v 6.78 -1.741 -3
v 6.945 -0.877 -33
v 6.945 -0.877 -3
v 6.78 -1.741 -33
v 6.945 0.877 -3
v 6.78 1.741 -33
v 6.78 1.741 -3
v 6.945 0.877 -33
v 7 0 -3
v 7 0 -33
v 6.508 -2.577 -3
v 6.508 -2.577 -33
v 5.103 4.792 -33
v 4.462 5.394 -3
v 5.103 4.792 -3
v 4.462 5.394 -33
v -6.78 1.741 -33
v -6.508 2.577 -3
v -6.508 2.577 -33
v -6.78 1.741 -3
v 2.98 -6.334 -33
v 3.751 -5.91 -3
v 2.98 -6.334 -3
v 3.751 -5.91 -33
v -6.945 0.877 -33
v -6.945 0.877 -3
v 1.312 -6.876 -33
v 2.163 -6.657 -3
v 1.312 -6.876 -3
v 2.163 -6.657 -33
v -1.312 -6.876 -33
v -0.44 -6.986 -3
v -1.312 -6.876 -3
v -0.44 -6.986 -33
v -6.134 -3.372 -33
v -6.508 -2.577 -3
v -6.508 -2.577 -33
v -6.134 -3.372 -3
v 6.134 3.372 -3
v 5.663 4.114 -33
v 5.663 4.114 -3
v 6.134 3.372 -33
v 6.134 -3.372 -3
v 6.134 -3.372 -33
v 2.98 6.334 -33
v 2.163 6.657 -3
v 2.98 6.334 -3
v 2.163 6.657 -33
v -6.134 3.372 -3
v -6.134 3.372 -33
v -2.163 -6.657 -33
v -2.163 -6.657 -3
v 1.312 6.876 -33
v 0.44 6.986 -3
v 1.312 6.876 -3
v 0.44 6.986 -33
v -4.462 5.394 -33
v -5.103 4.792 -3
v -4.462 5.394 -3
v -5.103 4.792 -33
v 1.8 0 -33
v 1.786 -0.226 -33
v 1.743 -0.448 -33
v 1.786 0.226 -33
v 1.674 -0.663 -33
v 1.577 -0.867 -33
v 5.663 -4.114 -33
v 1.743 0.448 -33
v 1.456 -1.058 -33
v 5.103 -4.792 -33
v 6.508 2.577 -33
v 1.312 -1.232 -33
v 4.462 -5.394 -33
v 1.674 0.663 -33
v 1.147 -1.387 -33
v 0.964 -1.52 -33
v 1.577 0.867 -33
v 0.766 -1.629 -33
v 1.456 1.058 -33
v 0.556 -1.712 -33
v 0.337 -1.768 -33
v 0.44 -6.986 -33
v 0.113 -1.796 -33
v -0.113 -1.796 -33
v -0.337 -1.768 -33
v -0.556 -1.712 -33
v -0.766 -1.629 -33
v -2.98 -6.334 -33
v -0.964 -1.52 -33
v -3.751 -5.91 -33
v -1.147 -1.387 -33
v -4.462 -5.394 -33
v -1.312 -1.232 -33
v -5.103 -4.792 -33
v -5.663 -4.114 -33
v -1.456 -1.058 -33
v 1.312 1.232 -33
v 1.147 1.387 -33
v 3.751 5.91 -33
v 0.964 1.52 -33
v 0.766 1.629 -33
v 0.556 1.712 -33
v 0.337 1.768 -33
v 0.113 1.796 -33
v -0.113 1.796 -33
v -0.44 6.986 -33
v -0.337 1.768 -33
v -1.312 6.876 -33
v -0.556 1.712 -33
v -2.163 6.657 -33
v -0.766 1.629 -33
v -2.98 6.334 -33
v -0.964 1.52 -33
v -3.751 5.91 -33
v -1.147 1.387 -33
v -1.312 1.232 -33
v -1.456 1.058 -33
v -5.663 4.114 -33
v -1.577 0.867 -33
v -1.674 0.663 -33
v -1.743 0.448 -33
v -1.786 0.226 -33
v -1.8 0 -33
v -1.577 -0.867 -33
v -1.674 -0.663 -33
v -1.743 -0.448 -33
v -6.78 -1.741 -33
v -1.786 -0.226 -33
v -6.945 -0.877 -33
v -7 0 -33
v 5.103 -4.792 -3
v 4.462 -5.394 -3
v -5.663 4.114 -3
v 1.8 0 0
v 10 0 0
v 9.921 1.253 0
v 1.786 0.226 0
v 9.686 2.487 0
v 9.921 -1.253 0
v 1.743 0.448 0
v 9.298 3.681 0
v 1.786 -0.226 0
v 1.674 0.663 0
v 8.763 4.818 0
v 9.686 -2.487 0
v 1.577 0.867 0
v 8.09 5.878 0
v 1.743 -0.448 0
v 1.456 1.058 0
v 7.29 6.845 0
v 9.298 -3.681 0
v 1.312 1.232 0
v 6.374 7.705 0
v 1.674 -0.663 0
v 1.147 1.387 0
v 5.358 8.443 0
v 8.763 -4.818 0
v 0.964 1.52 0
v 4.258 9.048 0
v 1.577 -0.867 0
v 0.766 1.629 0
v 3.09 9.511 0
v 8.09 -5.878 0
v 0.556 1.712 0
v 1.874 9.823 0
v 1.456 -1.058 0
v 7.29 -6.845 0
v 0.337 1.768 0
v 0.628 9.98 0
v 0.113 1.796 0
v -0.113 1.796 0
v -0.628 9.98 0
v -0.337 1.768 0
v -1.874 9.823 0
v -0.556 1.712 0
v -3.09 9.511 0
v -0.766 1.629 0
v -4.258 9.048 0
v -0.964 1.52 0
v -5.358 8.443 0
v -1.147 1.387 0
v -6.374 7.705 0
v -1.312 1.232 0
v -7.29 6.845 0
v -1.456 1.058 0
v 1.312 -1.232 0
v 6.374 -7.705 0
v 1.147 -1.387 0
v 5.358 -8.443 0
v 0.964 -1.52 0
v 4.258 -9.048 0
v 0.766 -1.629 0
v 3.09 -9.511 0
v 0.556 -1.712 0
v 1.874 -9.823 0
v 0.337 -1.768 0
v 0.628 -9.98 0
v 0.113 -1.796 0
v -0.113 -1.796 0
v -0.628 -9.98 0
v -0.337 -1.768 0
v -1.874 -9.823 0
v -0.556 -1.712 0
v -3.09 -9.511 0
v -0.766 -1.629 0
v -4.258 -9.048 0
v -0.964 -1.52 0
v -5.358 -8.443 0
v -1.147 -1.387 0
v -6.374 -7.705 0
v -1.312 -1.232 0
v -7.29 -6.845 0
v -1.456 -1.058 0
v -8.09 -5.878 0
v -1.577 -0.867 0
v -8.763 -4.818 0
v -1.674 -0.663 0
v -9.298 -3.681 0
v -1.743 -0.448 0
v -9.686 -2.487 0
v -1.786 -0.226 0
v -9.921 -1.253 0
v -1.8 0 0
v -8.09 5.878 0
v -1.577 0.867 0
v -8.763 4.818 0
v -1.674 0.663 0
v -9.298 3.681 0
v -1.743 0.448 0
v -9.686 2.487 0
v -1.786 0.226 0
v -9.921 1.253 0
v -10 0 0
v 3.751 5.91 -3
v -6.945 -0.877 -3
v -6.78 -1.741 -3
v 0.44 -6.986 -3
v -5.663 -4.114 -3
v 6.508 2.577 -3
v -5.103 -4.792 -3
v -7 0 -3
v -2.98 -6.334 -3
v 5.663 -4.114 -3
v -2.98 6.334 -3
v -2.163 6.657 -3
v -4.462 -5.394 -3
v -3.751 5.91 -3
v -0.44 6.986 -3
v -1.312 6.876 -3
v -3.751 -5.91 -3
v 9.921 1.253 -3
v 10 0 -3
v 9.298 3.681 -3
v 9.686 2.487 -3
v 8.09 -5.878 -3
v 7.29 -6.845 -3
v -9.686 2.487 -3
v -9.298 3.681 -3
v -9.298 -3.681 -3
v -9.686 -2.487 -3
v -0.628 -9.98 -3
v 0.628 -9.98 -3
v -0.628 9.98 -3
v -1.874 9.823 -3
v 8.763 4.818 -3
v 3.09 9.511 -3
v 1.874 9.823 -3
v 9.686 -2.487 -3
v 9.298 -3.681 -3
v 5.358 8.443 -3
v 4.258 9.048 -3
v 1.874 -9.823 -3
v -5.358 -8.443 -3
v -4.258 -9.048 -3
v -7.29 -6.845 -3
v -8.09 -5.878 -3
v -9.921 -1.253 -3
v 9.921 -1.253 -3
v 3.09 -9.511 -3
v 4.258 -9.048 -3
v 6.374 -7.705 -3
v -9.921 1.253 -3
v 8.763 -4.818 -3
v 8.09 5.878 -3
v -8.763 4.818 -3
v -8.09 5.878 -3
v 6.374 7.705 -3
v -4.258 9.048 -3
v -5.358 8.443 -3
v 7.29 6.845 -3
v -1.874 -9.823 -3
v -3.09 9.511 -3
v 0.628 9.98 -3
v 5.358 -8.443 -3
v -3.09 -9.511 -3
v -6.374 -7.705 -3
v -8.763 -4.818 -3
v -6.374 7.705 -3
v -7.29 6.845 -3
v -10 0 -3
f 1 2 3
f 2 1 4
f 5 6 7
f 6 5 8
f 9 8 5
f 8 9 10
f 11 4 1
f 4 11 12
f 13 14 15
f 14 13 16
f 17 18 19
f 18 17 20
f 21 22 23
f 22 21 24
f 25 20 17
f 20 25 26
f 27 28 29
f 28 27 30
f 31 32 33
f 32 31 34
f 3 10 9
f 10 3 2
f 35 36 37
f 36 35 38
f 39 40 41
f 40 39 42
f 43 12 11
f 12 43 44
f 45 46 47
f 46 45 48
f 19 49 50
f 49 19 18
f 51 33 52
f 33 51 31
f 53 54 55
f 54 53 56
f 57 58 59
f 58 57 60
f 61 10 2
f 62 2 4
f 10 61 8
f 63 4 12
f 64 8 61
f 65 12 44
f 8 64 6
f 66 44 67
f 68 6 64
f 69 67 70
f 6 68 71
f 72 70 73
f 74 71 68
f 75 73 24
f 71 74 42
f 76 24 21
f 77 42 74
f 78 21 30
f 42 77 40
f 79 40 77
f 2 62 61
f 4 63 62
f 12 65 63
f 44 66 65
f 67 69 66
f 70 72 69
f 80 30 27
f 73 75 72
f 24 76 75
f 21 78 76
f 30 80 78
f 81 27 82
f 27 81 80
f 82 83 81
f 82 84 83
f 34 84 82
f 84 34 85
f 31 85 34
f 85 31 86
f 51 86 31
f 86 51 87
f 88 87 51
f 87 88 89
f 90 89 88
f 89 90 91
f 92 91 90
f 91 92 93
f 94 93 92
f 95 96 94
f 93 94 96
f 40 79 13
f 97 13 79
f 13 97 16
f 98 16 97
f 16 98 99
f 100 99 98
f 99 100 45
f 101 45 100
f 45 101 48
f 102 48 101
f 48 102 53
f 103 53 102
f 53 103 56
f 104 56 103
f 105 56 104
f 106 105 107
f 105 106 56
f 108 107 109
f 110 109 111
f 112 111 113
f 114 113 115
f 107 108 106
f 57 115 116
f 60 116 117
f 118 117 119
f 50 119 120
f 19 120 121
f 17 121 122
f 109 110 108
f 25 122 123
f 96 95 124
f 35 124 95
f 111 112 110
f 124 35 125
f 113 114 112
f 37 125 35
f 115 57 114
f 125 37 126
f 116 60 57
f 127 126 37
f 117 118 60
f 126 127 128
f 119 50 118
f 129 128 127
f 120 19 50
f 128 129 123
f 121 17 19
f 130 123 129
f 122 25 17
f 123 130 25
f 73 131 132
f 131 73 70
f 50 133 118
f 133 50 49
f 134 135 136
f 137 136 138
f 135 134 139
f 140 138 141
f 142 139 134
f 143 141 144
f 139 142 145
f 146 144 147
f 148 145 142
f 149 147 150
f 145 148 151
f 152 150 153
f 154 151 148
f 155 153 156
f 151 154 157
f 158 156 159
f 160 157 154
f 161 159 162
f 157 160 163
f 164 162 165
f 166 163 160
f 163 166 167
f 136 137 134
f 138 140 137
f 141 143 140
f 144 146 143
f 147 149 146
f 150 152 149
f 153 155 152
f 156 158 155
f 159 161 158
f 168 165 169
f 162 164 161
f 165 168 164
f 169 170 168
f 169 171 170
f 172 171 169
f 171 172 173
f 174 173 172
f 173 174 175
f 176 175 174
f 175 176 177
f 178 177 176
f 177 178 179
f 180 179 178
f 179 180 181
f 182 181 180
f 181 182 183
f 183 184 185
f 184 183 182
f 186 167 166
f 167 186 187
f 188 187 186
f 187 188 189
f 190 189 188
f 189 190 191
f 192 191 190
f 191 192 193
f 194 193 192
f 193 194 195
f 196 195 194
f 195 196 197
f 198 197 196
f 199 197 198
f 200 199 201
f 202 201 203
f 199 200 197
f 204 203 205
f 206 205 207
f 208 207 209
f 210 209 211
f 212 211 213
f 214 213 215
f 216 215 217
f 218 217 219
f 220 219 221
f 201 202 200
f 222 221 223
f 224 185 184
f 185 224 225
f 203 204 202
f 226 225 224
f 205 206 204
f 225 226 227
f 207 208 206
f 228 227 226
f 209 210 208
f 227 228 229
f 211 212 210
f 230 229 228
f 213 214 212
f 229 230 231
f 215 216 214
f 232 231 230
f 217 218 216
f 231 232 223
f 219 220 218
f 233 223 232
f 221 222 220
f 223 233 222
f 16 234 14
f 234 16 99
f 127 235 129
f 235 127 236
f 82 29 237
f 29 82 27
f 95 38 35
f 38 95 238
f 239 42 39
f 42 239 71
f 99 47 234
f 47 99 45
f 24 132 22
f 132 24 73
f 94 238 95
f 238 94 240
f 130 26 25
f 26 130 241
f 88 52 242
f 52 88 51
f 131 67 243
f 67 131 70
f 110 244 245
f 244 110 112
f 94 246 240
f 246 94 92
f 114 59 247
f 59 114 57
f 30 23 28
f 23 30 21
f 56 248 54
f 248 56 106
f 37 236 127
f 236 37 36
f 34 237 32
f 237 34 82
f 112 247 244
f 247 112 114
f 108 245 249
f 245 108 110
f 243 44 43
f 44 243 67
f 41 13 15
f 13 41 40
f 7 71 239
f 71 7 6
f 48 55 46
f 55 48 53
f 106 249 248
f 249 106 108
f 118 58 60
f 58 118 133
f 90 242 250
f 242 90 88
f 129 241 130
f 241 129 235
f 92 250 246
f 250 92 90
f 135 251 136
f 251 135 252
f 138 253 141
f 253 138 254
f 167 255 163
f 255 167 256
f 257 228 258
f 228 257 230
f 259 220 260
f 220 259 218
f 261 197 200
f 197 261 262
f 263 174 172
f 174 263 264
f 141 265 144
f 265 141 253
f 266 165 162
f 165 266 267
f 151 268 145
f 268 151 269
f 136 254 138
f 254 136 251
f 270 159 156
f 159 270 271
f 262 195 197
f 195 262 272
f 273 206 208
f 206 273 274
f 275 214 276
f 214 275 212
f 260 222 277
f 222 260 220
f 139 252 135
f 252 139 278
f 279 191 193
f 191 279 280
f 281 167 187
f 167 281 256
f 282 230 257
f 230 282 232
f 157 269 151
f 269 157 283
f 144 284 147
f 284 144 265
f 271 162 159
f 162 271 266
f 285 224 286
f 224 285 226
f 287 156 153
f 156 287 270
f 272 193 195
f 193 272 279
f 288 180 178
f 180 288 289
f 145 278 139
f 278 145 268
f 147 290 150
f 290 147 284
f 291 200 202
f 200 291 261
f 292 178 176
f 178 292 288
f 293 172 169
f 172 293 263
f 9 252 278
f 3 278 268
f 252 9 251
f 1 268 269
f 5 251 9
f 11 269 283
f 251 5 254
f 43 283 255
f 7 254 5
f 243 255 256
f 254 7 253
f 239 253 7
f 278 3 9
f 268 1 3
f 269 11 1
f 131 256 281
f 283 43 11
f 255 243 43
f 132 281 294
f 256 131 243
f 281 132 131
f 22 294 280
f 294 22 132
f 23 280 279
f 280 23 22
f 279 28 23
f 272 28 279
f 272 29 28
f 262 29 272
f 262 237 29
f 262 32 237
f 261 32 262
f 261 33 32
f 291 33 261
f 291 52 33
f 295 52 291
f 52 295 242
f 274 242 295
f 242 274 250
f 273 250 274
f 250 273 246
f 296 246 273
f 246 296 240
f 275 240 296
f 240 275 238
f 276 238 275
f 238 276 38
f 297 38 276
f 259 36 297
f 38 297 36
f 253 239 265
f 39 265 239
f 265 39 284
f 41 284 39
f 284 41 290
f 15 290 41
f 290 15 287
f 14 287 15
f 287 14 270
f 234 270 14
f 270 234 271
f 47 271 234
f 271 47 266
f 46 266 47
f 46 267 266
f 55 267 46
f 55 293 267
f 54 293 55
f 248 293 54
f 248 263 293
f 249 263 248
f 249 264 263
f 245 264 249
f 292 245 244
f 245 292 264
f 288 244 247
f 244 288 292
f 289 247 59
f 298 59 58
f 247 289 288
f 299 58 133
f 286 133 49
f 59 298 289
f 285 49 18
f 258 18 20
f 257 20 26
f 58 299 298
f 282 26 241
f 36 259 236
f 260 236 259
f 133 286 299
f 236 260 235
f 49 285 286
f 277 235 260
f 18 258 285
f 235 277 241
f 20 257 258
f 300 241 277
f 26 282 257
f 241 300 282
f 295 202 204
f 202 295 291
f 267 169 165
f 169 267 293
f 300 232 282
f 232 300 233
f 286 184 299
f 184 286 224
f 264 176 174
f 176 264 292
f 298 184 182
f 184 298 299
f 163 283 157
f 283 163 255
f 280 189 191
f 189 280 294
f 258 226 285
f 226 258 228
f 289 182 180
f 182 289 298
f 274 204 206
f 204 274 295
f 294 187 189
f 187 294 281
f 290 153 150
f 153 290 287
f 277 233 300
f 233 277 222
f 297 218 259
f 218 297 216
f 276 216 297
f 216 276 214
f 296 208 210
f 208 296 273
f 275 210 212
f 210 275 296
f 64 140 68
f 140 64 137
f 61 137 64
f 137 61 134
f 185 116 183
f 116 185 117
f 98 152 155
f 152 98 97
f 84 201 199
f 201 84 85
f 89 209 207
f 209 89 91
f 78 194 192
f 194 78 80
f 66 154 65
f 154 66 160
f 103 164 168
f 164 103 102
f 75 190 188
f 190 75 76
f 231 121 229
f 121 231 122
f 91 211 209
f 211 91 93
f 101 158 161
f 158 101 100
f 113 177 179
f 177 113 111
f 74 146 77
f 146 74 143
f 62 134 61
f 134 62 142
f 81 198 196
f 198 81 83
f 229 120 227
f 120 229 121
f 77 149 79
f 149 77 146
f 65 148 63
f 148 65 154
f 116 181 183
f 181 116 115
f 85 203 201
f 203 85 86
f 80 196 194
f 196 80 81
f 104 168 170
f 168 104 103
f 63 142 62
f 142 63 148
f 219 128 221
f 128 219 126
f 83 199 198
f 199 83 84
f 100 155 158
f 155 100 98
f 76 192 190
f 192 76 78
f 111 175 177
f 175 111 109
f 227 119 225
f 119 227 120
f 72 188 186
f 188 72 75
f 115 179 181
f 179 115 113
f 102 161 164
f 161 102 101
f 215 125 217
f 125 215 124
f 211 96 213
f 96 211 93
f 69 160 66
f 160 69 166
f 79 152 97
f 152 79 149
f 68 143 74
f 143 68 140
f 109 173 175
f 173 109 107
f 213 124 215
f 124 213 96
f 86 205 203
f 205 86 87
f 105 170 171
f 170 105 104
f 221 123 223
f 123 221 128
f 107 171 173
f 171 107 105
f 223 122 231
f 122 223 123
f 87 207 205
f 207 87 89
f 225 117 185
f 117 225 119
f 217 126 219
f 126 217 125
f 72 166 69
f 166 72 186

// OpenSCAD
$fn = 50;


difference() {
	union() {
		translate(v = [0, 0, -33.0000000000]) {
			cylinder(h = 33, r = 7.0000000000);
		}
		translate(v = [0, 0, -3.0000000000]) {
			cylinder(h = 3, r = 10.0000000000);
		}
	}
	union() {
		#translate(v = [0, 0, -33]) {
			cylinder(h = 33, r = 1.8000000000);
		}
	}
}
